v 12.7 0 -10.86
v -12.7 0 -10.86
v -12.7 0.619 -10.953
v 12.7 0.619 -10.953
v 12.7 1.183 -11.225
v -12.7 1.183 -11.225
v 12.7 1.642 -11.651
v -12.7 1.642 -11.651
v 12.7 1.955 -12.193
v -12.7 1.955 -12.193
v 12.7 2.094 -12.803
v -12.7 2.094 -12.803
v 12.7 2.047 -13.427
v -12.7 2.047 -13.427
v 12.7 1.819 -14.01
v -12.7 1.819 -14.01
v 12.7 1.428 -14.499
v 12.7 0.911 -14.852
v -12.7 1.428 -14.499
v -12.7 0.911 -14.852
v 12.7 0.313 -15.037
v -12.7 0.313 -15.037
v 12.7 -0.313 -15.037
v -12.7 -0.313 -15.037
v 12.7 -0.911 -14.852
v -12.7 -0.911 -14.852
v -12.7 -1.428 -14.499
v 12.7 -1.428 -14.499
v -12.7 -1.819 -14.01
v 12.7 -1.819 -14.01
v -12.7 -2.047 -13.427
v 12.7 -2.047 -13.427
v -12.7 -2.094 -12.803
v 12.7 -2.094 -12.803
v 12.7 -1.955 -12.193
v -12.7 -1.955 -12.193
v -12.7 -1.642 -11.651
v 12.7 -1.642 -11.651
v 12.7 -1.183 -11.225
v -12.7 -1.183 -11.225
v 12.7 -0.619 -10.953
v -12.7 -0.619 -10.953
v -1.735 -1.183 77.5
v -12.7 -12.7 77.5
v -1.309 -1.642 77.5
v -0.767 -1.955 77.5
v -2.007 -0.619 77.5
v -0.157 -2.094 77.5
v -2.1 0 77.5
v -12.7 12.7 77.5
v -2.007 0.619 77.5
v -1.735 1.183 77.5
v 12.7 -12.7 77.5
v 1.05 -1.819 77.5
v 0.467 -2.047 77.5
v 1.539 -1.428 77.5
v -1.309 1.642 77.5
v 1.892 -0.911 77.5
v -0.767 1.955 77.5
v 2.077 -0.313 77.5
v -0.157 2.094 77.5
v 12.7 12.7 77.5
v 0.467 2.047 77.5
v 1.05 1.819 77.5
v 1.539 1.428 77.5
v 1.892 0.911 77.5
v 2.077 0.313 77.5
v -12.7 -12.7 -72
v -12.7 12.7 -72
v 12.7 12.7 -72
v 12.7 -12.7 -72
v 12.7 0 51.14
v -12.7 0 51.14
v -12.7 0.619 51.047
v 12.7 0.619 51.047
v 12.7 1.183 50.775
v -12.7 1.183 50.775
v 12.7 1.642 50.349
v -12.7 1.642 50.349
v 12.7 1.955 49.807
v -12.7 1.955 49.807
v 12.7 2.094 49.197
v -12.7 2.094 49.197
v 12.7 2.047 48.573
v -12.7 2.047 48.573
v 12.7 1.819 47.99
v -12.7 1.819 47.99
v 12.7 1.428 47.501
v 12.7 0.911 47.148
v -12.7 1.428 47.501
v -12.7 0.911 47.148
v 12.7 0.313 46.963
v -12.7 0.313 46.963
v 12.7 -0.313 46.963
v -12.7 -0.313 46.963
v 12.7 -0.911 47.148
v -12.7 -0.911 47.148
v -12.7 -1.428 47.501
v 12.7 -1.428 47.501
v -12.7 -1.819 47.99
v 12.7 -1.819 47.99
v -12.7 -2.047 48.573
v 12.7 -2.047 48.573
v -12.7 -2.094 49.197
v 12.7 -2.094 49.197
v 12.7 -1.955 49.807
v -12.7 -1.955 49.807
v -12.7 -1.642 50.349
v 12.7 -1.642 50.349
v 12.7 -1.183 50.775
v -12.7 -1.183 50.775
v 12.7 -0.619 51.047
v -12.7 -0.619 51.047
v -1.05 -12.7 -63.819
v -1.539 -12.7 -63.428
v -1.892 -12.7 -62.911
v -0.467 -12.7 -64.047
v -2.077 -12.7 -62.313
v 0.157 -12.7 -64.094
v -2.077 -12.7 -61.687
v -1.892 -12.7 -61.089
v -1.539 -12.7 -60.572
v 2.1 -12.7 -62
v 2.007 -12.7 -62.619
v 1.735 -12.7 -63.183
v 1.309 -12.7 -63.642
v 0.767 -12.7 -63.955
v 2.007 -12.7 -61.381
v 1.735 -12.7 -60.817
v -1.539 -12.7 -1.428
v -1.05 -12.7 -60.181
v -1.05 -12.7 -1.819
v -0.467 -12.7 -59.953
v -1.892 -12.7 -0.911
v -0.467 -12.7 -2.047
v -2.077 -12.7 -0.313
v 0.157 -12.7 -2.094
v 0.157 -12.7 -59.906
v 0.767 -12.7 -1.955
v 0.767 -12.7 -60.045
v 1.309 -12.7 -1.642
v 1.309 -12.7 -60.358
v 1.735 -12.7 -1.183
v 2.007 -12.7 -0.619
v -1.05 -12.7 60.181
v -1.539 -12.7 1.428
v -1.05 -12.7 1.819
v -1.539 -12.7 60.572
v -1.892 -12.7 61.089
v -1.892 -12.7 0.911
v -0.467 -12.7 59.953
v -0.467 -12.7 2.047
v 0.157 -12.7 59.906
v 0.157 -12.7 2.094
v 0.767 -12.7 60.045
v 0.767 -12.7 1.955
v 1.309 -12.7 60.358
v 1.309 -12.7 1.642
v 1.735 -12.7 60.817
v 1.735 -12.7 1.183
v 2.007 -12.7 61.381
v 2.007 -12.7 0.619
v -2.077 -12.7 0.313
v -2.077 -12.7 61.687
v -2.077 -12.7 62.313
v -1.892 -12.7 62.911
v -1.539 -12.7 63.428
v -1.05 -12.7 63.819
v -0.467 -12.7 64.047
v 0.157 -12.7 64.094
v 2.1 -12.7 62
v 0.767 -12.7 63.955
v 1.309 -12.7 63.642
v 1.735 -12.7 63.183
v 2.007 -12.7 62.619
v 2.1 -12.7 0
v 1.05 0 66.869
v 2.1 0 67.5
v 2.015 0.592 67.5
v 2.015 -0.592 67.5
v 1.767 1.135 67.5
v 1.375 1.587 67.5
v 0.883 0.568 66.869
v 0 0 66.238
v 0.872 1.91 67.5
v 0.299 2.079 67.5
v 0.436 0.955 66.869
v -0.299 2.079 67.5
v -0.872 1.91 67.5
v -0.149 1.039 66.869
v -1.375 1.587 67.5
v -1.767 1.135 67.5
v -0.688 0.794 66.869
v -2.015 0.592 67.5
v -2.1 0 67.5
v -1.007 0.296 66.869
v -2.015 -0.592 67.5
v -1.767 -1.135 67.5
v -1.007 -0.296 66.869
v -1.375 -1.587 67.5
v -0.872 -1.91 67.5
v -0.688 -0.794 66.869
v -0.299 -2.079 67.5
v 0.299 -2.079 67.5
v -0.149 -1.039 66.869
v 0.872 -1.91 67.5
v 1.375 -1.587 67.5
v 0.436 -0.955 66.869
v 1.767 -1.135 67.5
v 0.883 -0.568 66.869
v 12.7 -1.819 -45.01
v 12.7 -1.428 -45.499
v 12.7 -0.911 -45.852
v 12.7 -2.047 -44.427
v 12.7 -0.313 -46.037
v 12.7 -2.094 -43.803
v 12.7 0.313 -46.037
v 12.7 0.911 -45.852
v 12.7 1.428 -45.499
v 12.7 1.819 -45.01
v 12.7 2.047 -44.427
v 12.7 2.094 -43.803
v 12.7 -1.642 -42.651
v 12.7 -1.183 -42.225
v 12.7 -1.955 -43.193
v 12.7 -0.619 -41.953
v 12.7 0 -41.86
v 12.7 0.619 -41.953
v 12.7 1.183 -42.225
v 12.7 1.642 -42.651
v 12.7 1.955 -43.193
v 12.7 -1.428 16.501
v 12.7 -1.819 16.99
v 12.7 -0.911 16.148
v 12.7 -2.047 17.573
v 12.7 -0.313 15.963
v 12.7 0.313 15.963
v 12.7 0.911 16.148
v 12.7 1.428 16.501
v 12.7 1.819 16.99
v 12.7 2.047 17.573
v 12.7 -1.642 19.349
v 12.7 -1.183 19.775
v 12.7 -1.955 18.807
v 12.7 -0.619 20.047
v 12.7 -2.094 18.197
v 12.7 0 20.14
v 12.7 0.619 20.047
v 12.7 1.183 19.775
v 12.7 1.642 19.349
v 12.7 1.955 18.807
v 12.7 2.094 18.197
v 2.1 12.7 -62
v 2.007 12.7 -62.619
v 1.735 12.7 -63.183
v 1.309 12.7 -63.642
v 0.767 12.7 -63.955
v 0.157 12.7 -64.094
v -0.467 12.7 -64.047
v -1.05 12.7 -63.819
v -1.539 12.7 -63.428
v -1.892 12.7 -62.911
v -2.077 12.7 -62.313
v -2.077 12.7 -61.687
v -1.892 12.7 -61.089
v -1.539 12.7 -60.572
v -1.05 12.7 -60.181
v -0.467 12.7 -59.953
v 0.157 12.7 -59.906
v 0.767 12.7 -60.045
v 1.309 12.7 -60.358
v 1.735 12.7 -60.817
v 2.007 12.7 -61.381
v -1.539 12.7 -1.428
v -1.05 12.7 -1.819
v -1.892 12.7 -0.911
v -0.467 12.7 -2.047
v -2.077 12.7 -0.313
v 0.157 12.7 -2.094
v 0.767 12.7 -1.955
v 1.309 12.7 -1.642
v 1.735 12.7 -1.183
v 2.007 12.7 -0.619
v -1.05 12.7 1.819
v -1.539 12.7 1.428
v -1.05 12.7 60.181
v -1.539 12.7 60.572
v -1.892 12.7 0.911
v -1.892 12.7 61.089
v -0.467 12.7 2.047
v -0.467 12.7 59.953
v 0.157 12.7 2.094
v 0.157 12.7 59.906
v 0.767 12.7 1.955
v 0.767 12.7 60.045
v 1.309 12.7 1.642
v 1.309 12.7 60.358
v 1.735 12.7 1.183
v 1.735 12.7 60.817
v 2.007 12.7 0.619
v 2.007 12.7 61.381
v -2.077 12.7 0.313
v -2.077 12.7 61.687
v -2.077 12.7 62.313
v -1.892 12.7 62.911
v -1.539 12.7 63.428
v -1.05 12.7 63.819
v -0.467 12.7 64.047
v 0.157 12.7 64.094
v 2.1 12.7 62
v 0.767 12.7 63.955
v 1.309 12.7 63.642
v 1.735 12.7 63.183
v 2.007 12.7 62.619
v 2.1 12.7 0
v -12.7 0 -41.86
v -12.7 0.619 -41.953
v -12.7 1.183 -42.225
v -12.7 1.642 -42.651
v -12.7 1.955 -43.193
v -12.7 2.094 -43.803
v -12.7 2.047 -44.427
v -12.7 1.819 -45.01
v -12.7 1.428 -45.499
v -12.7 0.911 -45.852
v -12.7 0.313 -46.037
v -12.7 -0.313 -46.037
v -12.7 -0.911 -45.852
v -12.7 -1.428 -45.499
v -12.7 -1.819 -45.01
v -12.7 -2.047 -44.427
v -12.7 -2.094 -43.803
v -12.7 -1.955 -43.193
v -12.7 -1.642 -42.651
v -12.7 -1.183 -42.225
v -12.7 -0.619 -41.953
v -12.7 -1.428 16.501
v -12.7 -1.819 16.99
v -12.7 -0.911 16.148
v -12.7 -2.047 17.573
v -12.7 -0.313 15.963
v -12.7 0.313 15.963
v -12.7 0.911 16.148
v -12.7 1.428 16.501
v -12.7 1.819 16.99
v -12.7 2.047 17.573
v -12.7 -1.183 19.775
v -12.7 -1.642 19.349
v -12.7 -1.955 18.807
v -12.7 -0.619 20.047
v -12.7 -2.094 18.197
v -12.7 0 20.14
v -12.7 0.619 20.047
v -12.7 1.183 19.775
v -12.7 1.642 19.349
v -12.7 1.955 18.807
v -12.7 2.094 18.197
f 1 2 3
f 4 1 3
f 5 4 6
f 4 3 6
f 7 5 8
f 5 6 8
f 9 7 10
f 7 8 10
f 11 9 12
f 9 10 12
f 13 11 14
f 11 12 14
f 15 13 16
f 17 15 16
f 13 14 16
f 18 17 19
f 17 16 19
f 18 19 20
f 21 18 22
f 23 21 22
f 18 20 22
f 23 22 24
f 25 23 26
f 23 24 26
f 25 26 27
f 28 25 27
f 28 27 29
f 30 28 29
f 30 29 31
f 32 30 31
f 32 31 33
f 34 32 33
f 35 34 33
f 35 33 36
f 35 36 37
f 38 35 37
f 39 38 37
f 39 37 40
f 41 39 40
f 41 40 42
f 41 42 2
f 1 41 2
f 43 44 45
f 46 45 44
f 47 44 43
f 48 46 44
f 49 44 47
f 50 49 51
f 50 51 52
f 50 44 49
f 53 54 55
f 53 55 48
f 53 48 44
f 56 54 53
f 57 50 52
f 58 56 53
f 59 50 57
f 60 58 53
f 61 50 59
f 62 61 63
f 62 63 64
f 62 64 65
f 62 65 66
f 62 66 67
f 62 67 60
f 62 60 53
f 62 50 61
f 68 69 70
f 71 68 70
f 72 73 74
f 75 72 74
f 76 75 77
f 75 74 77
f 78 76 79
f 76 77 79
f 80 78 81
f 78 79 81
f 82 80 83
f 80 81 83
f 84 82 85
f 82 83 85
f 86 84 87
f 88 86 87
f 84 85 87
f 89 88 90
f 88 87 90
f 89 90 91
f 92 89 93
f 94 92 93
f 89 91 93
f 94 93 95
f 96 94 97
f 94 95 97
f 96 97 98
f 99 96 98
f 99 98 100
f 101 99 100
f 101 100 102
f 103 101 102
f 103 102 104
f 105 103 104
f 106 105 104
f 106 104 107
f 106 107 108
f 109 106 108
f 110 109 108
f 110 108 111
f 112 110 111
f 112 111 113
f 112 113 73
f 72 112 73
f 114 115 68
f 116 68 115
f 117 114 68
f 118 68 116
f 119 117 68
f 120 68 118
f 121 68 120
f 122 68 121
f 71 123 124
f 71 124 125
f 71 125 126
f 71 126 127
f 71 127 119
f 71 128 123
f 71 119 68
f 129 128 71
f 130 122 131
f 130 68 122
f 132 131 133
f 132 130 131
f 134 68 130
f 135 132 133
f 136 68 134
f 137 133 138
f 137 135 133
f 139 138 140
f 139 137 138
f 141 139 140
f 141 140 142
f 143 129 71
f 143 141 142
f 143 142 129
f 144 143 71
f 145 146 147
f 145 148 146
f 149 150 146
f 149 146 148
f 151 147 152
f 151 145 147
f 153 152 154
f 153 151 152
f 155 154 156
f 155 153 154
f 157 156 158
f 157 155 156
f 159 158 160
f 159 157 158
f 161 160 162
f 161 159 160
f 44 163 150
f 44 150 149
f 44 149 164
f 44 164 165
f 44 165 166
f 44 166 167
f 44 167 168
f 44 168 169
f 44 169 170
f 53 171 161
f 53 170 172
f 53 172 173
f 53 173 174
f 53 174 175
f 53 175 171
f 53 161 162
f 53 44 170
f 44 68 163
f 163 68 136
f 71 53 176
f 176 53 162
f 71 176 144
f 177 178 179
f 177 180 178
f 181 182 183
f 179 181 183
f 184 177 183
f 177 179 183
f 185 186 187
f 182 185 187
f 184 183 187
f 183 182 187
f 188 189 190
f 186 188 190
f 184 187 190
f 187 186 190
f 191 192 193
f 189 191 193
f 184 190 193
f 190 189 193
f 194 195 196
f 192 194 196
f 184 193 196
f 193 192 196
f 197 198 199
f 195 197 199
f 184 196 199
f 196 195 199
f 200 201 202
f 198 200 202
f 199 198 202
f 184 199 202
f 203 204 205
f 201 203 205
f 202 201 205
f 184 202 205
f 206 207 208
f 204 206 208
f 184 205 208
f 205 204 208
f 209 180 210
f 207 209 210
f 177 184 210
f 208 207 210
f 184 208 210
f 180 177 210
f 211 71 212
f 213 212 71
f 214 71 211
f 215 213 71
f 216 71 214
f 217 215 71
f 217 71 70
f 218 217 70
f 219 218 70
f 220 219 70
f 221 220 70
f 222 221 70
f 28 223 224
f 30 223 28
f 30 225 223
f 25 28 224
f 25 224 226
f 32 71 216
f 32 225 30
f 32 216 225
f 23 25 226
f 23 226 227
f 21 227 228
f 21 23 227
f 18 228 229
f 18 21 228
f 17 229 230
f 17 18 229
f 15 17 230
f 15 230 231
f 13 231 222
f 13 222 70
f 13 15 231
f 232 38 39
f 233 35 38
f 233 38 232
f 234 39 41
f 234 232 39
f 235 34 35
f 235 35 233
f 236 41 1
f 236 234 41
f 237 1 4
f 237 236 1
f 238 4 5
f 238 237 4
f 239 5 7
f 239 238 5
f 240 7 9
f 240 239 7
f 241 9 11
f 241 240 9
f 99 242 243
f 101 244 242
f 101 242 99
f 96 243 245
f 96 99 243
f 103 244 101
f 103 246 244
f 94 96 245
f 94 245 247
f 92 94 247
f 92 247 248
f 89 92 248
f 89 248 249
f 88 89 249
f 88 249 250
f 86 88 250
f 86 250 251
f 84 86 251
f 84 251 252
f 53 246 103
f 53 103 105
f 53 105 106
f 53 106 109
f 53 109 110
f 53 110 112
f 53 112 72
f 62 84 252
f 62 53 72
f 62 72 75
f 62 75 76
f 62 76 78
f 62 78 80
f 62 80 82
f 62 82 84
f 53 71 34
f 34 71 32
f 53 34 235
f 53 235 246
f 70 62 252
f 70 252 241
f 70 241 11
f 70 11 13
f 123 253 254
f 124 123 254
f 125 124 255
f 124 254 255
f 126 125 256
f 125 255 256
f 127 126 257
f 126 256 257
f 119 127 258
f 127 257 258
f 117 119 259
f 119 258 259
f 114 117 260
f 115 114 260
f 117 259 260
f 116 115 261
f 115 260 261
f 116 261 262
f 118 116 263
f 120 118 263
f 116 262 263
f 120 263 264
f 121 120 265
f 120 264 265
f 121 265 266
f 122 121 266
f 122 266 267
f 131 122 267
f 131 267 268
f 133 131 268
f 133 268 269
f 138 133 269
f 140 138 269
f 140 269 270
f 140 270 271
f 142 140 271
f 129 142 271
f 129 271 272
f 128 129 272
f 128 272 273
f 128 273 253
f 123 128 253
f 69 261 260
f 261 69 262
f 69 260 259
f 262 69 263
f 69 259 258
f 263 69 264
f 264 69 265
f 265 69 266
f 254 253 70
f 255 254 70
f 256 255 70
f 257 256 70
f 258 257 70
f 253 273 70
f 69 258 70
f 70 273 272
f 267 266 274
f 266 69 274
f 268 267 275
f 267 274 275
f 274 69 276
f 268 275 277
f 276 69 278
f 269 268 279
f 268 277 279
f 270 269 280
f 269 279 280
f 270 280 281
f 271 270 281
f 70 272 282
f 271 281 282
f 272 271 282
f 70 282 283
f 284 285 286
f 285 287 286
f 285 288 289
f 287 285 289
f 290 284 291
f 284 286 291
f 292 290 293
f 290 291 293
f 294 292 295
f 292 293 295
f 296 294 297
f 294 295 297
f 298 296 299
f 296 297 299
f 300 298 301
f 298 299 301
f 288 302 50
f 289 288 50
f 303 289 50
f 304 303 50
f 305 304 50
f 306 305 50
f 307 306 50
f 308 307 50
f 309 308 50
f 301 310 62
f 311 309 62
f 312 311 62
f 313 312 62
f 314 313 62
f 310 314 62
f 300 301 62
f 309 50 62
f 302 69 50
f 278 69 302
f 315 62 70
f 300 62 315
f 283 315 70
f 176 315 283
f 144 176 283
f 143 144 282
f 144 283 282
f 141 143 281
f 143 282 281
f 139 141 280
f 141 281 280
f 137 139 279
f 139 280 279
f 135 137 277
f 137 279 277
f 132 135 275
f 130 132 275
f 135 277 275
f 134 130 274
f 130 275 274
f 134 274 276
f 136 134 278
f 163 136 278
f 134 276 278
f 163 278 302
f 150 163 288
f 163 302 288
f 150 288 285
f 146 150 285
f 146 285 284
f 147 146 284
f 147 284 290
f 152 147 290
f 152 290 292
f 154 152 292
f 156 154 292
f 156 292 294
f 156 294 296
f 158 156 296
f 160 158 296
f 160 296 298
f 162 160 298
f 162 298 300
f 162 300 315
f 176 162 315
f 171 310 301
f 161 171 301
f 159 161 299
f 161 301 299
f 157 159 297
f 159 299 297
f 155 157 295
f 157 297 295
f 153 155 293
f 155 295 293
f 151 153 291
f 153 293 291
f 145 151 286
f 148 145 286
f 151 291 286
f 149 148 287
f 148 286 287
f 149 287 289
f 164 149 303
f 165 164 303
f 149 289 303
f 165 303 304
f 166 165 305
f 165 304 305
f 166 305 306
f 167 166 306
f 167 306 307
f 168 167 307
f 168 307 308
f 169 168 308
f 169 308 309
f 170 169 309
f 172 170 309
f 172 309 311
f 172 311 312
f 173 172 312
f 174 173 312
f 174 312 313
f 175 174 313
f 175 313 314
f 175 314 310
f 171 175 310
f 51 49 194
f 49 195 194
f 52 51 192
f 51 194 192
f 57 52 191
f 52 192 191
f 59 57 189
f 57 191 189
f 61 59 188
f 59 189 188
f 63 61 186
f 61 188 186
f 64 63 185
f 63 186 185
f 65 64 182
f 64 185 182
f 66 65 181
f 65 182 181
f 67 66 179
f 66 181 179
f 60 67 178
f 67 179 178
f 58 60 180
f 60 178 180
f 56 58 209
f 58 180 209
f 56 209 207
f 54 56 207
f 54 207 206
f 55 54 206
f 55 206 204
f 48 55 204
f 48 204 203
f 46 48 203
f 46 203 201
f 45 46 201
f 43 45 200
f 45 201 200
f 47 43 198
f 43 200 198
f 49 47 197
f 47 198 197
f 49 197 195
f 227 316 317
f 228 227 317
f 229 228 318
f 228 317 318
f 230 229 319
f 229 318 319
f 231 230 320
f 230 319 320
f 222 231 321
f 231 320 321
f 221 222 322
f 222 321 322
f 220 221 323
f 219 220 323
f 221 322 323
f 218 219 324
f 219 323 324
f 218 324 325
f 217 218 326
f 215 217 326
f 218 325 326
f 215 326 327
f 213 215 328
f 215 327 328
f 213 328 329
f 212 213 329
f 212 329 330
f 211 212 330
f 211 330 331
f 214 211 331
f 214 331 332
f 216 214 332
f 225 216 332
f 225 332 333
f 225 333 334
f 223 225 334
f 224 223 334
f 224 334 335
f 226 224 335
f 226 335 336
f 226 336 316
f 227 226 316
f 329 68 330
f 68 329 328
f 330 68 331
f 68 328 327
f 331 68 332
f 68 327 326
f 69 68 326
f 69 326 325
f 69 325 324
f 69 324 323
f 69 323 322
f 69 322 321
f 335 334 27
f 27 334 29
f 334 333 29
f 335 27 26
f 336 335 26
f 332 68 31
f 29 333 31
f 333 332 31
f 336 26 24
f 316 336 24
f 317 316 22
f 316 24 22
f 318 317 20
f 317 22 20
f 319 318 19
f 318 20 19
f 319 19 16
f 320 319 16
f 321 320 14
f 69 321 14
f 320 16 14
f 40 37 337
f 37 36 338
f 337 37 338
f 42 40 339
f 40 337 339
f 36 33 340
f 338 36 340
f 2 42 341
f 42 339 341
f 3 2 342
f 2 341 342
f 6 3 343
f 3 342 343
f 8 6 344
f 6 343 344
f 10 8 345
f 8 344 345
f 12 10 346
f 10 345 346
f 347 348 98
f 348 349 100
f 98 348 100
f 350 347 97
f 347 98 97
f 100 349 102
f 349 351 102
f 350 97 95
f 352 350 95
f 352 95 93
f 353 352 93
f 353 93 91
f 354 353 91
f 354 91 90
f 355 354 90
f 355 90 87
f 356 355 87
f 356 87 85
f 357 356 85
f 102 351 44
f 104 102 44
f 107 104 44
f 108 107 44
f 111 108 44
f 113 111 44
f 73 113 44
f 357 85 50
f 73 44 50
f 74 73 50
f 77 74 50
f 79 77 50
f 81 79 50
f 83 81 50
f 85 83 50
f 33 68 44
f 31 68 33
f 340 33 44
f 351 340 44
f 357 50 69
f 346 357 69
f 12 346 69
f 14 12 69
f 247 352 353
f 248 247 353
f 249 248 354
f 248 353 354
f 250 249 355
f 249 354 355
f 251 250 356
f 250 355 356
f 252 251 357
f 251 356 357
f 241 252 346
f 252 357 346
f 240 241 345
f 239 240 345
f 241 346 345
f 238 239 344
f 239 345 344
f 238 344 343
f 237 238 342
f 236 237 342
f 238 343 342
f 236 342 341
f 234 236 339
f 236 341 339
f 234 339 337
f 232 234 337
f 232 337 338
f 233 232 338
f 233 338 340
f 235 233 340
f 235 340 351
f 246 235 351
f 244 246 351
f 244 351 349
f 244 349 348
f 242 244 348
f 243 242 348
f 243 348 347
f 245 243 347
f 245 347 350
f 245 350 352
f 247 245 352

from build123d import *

# Parameters (mm, degrees)
SKETCH1_W                   = 25.4
SKETCH1_H                   = 25.4
BOSS_EXTRUDE1_DEPTH         = 77.5
M5X0_8_TAPPED_HOLE2_D       = 4.2
M5X0_8_TAPPED_HOLE1_D       = 4.2
M5X0_8_TAPPED_HOLE1_DEPTH   = 10
M5X0_8_TAPPED_HOLE1_TIP     = 1.2618073
SKETCH13_W                  = 25.4
SKETCH13_H                  = 5.5
CUT_EXTRUDE1_DEPTH          = 26.4
TAP_DRILL_FOR_M5X0_8_TAP1_D = 4.2


with BuildPart() as part:
    # Sketch1 → Boss-Extrude1 (new body, symmetric)
    with BuildSketch(Plane.XY):
        Rectangle(SKETCH1_W, SKETCH1_H)
    extrude(amount=BOSS_EXTRUDE1_DEPTH, both=True)

    # M5x0.8 Tapped Hole2 (through all)
    with Locations(Plane(origin=(0, -12.7, 0), x_dir=(-1, 0, 0), z_dir=(0, -1, 0))):
        with Locations((0, -62), (0, 0), (0, 62)):
            Hole(M5X0_8_TAPPED_HOLE2_D / 2)

    # M5x0.8 Tapped Hole1
    with Locations(Plane.XY.offset(77.5)):
        with Locations((0, 0)):
            Hole(M5X0_8_TAPPED_HOLE1_D / 2, depth=M5X0_8_TAPPED_HOLE1_DEPTH)
            with Locations((0, 0, -(M5X0_8_TAPPED_HOLE1_DEPTH + M5X0_8_TAPPED_HOLE1_TIP / 2))):  # 118° drill point
                Cone(0, M5X0_8_TAPPED_HOLE1_D / 2, M5X0_8_TAPPED_HOLE1_TIP, mode=Mode.SUBTRACT)

    # Sketch13 → Cut-Extrude1 (cut, through all)
    with BuildSketch(Plane(origin=(0, 12.7, 0), x_dir=(1, 0, 0), z_dir=(0, 1, 0))):
        with Locations((0, 74.75)):
            Rectangle(SKETCH13_W, SKETCH13_H)
    extrude(amount=-CUT_EXTRUDE1_DEPTH, mode=Mode.SUBTRACT)

    # Tap Drill for M5x0.8 Tap1 (through all)
    with Locations(Plane(origin=(12.7, 0, 0), x_dir=(0, 0, -1), z_dir=(1, 0, 0))):
        with Locations((-49.04, 0), (-18.04, 0), (12.96, 0), (43.96, 0)):
            Hole(TAP_DRILL_FOR_M5X0_8_TAP1_D / 2)


solid = part.part
